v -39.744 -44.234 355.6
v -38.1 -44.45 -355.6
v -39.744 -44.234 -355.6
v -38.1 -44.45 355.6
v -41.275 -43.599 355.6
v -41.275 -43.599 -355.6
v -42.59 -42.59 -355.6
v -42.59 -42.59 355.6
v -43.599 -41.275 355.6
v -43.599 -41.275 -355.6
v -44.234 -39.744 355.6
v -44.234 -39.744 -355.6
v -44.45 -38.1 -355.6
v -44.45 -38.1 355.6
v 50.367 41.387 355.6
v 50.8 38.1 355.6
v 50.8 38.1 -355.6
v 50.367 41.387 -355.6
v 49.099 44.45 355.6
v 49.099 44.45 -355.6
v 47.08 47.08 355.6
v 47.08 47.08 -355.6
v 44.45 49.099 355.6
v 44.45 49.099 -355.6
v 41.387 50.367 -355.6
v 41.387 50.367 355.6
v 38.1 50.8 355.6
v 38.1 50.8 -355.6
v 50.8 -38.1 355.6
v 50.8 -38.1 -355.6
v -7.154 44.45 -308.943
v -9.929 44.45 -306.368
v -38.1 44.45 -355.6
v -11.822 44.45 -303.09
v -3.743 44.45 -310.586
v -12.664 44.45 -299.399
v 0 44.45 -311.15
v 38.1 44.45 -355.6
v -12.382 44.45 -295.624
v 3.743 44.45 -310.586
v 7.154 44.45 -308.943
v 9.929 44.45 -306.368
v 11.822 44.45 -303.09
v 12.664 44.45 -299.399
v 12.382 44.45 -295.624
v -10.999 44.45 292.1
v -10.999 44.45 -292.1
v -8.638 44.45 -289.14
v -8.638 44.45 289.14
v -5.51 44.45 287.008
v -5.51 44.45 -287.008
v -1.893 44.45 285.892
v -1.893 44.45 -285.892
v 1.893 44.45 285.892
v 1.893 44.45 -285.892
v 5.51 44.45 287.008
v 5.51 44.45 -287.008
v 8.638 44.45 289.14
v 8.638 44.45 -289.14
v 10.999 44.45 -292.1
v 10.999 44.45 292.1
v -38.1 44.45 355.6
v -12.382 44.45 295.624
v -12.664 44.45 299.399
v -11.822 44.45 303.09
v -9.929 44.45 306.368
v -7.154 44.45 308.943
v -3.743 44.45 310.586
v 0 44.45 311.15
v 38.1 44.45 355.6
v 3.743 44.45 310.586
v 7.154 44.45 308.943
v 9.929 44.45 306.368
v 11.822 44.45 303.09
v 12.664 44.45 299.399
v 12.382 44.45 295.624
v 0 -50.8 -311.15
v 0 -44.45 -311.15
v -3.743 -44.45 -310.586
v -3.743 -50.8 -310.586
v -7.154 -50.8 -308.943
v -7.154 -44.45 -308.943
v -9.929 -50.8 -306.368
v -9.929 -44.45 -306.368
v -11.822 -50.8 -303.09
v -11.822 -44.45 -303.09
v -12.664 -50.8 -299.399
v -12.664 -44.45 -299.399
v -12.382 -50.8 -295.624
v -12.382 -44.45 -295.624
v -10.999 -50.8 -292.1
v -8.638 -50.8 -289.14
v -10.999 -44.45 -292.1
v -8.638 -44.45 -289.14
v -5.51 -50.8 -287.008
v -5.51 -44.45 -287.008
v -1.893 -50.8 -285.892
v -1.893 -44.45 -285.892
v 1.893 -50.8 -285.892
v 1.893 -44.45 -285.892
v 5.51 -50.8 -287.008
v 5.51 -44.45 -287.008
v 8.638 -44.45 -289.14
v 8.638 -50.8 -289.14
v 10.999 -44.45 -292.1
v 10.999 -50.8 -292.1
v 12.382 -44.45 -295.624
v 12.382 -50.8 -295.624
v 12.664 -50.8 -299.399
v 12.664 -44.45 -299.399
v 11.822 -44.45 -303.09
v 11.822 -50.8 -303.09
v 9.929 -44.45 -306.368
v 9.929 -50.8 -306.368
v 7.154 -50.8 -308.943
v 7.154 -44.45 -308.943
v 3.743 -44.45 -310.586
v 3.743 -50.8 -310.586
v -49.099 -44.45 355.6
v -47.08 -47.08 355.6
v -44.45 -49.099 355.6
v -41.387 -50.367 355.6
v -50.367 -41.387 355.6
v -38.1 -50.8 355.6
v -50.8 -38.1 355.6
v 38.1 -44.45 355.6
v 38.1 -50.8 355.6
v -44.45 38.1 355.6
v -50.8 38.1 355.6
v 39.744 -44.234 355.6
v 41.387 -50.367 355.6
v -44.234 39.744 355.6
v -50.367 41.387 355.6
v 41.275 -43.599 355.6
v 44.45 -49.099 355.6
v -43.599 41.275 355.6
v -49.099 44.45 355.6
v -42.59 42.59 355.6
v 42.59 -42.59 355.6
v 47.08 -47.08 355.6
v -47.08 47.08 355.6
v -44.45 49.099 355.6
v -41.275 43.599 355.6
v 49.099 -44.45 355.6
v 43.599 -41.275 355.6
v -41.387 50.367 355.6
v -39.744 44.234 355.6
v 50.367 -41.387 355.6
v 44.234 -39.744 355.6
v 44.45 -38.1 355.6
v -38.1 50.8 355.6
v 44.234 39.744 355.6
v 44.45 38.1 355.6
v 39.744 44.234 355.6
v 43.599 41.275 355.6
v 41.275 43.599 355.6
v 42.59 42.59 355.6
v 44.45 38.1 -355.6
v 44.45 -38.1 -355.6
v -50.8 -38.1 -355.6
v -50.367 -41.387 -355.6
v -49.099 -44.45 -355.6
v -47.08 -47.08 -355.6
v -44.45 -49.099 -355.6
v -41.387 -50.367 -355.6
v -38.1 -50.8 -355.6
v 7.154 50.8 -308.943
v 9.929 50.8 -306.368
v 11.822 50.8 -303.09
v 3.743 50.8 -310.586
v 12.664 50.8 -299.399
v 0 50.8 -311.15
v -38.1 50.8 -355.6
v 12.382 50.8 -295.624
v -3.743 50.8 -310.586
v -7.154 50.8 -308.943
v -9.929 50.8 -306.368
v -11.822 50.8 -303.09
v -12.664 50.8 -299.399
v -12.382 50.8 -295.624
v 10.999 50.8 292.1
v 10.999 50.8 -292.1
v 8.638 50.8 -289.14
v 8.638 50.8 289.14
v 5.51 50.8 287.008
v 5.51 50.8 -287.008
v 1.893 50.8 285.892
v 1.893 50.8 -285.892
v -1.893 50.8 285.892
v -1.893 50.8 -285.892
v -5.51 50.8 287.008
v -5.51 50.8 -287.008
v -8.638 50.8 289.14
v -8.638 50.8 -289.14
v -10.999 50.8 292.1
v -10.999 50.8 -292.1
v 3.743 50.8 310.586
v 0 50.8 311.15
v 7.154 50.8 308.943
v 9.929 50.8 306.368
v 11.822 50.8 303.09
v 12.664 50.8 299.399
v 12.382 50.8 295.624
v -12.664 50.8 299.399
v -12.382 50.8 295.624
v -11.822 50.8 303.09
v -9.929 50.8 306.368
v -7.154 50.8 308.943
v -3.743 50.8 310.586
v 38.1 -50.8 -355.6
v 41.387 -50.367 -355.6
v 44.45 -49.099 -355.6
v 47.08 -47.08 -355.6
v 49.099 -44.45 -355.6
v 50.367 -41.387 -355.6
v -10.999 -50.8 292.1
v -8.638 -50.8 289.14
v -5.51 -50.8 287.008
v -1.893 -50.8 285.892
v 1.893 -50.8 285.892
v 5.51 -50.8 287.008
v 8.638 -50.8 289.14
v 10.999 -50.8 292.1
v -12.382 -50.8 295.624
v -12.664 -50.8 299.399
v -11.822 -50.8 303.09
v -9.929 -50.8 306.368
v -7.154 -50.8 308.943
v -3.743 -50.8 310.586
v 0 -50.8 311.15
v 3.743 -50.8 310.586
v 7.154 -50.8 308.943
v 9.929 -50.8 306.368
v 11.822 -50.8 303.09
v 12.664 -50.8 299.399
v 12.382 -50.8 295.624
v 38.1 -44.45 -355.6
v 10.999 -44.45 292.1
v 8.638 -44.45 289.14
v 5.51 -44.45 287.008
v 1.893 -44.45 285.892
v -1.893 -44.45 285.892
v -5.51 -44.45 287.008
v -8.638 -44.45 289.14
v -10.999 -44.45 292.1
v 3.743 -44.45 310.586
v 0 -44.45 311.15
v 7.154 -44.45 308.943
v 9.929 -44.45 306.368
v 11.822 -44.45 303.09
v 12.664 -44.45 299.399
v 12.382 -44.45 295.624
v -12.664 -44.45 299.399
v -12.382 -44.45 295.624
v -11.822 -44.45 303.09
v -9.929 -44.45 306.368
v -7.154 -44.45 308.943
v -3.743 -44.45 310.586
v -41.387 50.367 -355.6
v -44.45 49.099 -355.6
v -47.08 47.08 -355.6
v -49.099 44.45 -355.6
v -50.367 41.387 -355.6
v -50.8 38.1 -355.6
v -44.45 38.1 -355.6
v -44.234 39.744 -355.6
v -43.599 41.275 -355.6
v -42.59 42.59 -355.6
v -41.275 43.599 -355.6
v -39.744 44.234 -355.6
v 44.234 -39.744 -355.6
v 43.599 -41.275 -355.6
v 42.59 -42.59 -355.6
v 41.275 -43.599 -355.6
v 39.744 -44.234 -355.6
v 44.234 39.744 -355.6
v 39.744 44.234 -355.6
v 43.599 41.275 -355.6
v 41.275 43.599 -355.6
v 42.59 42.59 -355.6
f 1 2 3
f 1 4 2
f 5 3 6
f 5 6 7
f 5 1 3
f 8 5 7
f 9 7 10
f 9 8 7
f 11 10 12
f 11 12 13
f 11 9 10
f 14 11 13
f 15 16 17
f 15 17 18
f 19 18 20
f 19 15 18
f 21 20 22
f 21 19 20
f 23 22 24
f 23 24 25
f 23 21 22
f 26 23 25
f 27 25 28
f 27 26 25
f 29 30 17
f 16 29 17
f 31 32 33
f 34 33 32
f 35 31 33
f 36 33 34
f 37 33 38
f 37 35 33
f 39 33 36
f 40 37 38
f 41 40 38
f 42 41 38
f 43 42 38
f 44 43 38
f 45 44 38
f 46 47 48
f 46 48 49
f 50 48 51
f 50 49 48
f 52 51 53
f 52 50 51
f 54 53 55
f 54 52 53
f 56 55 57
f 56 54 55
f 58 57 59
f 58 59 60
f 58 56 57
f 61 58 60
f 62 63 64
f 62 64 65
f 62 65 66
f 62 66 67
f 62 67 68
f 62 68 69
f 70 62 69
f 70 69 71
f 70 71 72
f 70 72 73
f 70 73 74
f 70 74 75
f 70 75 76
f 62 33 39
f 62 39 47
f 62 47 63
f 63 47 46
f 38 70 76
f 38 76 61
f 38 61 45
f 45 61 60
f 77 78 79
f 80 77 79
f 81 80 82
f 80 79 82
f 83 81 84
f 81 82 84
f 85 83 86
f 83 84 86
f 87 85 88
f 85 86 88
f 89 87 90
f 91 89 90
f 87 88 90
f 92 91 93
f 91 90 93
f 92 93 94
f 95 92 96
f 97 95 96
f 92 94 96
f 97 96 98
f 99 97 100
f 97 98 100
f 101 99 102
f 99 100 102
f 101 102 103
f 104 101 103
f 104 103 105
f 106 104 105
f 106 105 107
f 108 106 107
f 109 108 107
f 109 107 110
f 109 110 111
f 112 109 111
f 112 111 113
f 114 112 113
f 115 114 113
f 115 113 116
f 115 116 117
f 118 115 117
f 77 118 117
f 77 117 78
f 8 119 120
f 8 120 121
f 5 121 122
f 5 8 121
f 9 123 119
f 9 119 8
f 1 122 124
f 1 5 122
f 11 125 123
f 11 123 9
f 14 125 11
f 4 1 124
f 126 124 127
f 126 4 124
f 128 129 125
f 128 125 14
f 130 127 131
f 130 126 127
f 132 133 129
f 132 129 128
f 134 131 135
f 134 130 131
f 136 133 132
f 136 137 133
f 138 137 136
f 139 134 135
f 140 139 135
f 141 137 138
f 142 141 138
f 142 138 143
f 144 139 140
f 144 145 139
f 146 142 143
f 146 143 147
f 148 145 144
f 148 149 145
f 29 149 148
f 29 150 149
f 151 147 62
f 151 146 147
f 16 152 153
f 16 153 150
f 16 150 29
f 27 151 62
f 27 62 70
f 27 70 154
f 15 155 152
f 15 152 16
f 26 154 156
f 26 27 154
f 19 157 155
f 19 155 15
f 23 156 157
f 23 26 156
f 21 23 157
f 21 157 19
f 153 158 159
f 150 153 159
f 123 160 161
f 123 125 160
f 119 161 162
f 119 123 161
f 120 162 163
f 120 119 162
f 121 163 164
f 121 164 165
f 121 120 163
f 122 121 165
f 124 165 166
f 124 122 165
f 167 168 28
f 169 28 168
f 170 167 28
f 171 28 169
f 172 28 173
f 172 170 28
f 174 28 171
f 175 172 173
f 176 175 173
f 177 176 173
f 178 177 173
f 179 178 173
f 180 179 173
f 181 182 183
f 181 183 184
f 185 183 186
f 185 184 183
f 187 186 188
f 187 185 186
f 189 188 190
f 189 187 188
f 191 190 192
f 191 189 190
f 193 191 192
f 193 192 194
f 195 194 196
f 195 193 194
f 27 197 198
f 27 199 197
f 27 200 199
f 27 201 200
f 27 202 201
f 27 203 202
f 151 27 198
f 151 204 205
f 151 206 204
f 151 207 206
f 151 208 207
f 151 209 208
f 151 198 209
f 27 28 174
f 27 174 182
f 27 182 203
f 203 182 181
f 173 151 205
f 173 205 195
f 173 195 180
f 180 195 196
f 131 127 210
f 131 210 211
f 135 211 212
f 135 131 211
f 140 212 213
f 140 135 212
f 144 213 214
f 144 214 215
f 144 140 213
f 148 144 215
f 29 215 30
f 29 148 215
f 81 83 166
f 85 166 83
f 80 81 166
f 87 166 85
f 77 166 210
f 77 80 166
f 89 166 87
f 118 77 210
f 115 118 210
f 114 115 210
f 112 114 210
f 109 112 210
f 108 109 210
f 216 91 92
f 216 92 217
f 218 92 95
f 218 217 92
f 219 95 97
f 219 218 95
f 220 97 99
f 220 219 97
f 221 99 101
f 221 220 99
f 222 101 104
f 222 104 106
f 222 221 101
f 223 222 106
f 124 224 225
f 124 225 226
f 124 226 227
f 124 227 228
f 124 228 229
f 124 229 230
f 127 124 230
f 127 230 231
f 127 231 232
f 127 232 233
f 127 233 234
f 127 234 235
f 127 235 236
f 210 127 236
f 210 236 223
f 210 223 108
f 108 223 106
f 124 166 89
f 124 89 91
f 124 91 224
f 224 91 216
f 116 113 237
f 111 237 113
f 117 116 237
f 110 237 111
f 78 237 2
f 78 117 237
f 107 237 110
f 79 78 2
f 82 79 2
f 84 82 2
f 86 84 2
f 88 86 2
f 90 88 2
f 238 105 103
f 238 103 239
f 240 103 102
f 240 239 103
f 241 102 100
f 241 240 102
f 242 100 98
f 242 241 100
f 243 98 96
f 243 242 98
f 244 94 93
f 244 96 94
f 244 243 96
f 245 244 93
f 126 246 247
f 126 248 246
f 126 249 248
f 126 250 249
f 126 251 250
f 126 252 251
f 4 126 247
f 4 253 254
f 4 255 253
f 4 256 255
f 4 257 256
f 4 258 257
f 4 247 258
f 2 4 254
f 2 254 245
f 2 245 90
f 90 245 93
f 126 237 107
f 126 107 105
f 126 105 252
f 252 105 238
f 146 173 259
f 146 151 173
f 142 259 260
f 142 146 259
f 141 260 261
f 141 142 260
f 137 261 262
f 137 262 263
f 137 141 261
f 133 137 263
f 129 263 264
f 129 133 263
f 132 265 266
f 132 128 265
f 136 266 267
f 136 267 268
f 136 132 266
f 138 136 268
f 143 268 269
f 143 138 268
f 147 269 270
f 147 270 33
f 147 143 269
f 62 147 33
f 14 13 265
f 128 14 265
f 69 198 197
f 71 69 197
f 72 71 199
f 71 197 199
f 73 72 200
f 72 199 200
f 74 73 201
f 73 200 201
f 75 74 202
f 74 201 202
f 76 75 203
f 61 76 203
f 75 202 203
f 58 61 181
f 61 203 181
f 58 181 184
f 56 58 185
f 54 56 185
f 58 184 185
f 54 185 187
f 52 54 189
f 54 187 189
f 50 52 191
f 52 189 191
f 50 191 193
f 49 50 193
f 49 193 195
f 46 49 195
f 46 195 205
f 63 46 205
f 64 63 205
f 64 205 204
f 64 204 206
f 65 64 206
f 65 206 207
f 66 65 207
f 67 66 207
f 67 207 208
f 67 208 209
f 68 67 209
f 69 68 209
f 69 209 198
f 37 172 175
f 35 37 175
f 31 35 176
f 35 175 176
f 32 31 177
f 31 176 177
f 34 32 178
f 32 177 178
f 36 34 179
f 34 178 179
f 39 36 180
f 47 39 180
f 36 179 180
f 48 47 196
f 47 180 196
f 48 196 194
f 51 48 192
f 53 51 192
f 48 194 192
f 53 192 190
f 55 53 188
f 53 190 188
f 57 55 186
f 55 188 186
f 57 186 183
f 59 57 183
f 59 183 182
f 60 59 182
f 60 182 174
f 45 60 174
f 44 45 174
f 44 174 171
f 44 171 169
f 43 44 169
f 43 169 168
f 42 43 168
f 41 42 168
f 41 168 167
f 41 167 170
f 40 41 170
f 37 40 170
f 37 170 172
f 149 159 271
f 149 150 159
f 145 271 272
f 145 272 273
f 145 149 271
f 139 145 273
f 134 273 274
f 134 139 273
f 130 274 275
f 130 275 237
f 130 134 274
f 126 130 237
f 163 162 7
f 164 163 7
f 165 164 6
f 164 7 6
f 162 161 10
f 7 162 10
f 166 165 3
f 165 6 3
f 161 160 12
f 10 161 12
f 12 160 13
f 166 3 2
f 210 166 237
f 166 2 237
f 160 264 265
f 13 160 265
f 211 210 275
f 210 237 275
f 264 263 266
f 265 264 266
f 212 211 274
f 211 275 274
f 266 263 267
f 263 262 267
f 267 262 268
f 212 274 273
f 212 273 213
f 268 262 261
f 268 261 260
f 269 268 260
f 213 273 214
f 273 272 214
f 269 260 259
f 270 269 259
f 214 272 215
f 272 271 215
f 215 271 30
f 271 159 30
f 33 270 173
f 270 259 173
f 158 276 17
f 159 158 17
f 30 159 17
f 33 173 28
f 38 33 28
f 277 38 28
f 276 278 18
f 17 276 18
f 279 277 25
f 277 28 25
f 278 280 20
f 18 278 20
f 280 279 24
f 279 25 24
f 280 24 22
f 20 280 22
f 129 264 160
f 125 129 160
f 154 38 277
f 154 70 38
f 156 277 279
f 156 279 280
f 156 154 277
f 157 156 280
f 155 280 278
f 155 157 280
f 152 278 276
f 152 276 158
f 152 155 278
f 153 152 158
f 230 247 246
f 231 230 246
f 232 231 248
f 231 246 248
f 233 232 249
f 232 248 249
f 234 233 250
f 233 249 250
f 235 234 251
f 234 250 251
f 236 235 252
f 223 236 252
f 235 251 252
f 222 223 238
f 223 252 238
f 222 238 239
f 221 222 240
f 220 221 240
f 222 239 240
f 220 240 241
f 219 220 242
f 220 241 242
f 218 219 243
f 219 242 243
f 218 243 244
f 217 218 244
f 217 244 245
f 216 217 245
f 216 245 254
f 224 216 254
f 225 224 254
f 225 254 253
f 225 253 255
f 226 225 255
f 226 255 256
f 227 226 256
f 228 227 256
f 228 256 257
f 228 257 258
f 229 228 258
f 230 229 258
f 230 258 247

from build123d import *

# Parameters (mm, degrees)
BOSS_EXTRUDE1_DEPTH = 355.6
SKETCH2_R           = 12.7
CUT_EXTRUDE1_DEPTH  = 374.3022368


with BuildPart() as part:
    # Sketch1 → Boss-Extrude1 (new, symmetric)
    with BuildSketch(Plane.XY):
        with BuildLine():
            Line((-38.1, -50.8), (38.1, -50.8))
            ThreePointArc((38.1, -50.8), (47.080256121, -47.080256121), (50.8, -38.1))
            Line((50.8, -38.1), (50.8, 38.1))
            ThreePointArc((50.8, 38.1), (47.080256121, 47.080256121), (38.1, 50.8))
            Line((38.1, 50.8), (-38.1, 50.8))
            ThreePointArc((-38.1, 50.8), (-47.080256121, 47.080256121), (-50.8, 38.1))
            Line((-50.8, 38.1), (-50.8, -38.1))
            ThreePointArc((-50.8, -38.1), (-47.080256121, -47.080256121), (-38.1, -50.8))
        make_face()
        with BuildLine():
            Line((-38.1, 44.45), (38.1, 44.45))
            ThreePointArc((38.1, 44.45), (42.590128061, 42.590128061), (44.45, 38.1))
            Line((44.45, 38.1), (44.45, -38.1))
            ThreePointArc((44.45, -38.1), (42.590128061, -42.590128061), (38.1, -44.45))
            Line((38.1, -44.45), (-38.1, -44.45))
            ThreePointArc((-38.1, -44.45), (-42.590128061, -42.590128061), (-44.45, -38.1))
            Line((-44.45, -38.1), (-44.45, 38.1))
            ThreePointArc((-44.45, 38.1), (-42.590128061, 42.590128061), (-38.1, 44.45))
        make_face(mode=Mode.SUBTRACT)
    extrude(amount=BOSS_EXTRUDE1_DEPTH, both=True)

    # Sketch2 → Cut-Extrude1 (cut, through all)
    with BuildSketch(Plane(origin=(0, 50.8, 0), x_dir=(1, 0, 0), z_dir=(0, 1, 0))):
        with Locations(Location((0, -298.45, 0), (0, 0, 270))):
            Circle(SKETCH2_R)
        with Locations(Location((0, 298.45, 0), (0, 0, 90))):
            Circle(SKETCH2_R)
    extrude(amount=-CUT_EXTRUDE1_DEPTH, mode=Mode.SUBTRACT)


solid = part.part
